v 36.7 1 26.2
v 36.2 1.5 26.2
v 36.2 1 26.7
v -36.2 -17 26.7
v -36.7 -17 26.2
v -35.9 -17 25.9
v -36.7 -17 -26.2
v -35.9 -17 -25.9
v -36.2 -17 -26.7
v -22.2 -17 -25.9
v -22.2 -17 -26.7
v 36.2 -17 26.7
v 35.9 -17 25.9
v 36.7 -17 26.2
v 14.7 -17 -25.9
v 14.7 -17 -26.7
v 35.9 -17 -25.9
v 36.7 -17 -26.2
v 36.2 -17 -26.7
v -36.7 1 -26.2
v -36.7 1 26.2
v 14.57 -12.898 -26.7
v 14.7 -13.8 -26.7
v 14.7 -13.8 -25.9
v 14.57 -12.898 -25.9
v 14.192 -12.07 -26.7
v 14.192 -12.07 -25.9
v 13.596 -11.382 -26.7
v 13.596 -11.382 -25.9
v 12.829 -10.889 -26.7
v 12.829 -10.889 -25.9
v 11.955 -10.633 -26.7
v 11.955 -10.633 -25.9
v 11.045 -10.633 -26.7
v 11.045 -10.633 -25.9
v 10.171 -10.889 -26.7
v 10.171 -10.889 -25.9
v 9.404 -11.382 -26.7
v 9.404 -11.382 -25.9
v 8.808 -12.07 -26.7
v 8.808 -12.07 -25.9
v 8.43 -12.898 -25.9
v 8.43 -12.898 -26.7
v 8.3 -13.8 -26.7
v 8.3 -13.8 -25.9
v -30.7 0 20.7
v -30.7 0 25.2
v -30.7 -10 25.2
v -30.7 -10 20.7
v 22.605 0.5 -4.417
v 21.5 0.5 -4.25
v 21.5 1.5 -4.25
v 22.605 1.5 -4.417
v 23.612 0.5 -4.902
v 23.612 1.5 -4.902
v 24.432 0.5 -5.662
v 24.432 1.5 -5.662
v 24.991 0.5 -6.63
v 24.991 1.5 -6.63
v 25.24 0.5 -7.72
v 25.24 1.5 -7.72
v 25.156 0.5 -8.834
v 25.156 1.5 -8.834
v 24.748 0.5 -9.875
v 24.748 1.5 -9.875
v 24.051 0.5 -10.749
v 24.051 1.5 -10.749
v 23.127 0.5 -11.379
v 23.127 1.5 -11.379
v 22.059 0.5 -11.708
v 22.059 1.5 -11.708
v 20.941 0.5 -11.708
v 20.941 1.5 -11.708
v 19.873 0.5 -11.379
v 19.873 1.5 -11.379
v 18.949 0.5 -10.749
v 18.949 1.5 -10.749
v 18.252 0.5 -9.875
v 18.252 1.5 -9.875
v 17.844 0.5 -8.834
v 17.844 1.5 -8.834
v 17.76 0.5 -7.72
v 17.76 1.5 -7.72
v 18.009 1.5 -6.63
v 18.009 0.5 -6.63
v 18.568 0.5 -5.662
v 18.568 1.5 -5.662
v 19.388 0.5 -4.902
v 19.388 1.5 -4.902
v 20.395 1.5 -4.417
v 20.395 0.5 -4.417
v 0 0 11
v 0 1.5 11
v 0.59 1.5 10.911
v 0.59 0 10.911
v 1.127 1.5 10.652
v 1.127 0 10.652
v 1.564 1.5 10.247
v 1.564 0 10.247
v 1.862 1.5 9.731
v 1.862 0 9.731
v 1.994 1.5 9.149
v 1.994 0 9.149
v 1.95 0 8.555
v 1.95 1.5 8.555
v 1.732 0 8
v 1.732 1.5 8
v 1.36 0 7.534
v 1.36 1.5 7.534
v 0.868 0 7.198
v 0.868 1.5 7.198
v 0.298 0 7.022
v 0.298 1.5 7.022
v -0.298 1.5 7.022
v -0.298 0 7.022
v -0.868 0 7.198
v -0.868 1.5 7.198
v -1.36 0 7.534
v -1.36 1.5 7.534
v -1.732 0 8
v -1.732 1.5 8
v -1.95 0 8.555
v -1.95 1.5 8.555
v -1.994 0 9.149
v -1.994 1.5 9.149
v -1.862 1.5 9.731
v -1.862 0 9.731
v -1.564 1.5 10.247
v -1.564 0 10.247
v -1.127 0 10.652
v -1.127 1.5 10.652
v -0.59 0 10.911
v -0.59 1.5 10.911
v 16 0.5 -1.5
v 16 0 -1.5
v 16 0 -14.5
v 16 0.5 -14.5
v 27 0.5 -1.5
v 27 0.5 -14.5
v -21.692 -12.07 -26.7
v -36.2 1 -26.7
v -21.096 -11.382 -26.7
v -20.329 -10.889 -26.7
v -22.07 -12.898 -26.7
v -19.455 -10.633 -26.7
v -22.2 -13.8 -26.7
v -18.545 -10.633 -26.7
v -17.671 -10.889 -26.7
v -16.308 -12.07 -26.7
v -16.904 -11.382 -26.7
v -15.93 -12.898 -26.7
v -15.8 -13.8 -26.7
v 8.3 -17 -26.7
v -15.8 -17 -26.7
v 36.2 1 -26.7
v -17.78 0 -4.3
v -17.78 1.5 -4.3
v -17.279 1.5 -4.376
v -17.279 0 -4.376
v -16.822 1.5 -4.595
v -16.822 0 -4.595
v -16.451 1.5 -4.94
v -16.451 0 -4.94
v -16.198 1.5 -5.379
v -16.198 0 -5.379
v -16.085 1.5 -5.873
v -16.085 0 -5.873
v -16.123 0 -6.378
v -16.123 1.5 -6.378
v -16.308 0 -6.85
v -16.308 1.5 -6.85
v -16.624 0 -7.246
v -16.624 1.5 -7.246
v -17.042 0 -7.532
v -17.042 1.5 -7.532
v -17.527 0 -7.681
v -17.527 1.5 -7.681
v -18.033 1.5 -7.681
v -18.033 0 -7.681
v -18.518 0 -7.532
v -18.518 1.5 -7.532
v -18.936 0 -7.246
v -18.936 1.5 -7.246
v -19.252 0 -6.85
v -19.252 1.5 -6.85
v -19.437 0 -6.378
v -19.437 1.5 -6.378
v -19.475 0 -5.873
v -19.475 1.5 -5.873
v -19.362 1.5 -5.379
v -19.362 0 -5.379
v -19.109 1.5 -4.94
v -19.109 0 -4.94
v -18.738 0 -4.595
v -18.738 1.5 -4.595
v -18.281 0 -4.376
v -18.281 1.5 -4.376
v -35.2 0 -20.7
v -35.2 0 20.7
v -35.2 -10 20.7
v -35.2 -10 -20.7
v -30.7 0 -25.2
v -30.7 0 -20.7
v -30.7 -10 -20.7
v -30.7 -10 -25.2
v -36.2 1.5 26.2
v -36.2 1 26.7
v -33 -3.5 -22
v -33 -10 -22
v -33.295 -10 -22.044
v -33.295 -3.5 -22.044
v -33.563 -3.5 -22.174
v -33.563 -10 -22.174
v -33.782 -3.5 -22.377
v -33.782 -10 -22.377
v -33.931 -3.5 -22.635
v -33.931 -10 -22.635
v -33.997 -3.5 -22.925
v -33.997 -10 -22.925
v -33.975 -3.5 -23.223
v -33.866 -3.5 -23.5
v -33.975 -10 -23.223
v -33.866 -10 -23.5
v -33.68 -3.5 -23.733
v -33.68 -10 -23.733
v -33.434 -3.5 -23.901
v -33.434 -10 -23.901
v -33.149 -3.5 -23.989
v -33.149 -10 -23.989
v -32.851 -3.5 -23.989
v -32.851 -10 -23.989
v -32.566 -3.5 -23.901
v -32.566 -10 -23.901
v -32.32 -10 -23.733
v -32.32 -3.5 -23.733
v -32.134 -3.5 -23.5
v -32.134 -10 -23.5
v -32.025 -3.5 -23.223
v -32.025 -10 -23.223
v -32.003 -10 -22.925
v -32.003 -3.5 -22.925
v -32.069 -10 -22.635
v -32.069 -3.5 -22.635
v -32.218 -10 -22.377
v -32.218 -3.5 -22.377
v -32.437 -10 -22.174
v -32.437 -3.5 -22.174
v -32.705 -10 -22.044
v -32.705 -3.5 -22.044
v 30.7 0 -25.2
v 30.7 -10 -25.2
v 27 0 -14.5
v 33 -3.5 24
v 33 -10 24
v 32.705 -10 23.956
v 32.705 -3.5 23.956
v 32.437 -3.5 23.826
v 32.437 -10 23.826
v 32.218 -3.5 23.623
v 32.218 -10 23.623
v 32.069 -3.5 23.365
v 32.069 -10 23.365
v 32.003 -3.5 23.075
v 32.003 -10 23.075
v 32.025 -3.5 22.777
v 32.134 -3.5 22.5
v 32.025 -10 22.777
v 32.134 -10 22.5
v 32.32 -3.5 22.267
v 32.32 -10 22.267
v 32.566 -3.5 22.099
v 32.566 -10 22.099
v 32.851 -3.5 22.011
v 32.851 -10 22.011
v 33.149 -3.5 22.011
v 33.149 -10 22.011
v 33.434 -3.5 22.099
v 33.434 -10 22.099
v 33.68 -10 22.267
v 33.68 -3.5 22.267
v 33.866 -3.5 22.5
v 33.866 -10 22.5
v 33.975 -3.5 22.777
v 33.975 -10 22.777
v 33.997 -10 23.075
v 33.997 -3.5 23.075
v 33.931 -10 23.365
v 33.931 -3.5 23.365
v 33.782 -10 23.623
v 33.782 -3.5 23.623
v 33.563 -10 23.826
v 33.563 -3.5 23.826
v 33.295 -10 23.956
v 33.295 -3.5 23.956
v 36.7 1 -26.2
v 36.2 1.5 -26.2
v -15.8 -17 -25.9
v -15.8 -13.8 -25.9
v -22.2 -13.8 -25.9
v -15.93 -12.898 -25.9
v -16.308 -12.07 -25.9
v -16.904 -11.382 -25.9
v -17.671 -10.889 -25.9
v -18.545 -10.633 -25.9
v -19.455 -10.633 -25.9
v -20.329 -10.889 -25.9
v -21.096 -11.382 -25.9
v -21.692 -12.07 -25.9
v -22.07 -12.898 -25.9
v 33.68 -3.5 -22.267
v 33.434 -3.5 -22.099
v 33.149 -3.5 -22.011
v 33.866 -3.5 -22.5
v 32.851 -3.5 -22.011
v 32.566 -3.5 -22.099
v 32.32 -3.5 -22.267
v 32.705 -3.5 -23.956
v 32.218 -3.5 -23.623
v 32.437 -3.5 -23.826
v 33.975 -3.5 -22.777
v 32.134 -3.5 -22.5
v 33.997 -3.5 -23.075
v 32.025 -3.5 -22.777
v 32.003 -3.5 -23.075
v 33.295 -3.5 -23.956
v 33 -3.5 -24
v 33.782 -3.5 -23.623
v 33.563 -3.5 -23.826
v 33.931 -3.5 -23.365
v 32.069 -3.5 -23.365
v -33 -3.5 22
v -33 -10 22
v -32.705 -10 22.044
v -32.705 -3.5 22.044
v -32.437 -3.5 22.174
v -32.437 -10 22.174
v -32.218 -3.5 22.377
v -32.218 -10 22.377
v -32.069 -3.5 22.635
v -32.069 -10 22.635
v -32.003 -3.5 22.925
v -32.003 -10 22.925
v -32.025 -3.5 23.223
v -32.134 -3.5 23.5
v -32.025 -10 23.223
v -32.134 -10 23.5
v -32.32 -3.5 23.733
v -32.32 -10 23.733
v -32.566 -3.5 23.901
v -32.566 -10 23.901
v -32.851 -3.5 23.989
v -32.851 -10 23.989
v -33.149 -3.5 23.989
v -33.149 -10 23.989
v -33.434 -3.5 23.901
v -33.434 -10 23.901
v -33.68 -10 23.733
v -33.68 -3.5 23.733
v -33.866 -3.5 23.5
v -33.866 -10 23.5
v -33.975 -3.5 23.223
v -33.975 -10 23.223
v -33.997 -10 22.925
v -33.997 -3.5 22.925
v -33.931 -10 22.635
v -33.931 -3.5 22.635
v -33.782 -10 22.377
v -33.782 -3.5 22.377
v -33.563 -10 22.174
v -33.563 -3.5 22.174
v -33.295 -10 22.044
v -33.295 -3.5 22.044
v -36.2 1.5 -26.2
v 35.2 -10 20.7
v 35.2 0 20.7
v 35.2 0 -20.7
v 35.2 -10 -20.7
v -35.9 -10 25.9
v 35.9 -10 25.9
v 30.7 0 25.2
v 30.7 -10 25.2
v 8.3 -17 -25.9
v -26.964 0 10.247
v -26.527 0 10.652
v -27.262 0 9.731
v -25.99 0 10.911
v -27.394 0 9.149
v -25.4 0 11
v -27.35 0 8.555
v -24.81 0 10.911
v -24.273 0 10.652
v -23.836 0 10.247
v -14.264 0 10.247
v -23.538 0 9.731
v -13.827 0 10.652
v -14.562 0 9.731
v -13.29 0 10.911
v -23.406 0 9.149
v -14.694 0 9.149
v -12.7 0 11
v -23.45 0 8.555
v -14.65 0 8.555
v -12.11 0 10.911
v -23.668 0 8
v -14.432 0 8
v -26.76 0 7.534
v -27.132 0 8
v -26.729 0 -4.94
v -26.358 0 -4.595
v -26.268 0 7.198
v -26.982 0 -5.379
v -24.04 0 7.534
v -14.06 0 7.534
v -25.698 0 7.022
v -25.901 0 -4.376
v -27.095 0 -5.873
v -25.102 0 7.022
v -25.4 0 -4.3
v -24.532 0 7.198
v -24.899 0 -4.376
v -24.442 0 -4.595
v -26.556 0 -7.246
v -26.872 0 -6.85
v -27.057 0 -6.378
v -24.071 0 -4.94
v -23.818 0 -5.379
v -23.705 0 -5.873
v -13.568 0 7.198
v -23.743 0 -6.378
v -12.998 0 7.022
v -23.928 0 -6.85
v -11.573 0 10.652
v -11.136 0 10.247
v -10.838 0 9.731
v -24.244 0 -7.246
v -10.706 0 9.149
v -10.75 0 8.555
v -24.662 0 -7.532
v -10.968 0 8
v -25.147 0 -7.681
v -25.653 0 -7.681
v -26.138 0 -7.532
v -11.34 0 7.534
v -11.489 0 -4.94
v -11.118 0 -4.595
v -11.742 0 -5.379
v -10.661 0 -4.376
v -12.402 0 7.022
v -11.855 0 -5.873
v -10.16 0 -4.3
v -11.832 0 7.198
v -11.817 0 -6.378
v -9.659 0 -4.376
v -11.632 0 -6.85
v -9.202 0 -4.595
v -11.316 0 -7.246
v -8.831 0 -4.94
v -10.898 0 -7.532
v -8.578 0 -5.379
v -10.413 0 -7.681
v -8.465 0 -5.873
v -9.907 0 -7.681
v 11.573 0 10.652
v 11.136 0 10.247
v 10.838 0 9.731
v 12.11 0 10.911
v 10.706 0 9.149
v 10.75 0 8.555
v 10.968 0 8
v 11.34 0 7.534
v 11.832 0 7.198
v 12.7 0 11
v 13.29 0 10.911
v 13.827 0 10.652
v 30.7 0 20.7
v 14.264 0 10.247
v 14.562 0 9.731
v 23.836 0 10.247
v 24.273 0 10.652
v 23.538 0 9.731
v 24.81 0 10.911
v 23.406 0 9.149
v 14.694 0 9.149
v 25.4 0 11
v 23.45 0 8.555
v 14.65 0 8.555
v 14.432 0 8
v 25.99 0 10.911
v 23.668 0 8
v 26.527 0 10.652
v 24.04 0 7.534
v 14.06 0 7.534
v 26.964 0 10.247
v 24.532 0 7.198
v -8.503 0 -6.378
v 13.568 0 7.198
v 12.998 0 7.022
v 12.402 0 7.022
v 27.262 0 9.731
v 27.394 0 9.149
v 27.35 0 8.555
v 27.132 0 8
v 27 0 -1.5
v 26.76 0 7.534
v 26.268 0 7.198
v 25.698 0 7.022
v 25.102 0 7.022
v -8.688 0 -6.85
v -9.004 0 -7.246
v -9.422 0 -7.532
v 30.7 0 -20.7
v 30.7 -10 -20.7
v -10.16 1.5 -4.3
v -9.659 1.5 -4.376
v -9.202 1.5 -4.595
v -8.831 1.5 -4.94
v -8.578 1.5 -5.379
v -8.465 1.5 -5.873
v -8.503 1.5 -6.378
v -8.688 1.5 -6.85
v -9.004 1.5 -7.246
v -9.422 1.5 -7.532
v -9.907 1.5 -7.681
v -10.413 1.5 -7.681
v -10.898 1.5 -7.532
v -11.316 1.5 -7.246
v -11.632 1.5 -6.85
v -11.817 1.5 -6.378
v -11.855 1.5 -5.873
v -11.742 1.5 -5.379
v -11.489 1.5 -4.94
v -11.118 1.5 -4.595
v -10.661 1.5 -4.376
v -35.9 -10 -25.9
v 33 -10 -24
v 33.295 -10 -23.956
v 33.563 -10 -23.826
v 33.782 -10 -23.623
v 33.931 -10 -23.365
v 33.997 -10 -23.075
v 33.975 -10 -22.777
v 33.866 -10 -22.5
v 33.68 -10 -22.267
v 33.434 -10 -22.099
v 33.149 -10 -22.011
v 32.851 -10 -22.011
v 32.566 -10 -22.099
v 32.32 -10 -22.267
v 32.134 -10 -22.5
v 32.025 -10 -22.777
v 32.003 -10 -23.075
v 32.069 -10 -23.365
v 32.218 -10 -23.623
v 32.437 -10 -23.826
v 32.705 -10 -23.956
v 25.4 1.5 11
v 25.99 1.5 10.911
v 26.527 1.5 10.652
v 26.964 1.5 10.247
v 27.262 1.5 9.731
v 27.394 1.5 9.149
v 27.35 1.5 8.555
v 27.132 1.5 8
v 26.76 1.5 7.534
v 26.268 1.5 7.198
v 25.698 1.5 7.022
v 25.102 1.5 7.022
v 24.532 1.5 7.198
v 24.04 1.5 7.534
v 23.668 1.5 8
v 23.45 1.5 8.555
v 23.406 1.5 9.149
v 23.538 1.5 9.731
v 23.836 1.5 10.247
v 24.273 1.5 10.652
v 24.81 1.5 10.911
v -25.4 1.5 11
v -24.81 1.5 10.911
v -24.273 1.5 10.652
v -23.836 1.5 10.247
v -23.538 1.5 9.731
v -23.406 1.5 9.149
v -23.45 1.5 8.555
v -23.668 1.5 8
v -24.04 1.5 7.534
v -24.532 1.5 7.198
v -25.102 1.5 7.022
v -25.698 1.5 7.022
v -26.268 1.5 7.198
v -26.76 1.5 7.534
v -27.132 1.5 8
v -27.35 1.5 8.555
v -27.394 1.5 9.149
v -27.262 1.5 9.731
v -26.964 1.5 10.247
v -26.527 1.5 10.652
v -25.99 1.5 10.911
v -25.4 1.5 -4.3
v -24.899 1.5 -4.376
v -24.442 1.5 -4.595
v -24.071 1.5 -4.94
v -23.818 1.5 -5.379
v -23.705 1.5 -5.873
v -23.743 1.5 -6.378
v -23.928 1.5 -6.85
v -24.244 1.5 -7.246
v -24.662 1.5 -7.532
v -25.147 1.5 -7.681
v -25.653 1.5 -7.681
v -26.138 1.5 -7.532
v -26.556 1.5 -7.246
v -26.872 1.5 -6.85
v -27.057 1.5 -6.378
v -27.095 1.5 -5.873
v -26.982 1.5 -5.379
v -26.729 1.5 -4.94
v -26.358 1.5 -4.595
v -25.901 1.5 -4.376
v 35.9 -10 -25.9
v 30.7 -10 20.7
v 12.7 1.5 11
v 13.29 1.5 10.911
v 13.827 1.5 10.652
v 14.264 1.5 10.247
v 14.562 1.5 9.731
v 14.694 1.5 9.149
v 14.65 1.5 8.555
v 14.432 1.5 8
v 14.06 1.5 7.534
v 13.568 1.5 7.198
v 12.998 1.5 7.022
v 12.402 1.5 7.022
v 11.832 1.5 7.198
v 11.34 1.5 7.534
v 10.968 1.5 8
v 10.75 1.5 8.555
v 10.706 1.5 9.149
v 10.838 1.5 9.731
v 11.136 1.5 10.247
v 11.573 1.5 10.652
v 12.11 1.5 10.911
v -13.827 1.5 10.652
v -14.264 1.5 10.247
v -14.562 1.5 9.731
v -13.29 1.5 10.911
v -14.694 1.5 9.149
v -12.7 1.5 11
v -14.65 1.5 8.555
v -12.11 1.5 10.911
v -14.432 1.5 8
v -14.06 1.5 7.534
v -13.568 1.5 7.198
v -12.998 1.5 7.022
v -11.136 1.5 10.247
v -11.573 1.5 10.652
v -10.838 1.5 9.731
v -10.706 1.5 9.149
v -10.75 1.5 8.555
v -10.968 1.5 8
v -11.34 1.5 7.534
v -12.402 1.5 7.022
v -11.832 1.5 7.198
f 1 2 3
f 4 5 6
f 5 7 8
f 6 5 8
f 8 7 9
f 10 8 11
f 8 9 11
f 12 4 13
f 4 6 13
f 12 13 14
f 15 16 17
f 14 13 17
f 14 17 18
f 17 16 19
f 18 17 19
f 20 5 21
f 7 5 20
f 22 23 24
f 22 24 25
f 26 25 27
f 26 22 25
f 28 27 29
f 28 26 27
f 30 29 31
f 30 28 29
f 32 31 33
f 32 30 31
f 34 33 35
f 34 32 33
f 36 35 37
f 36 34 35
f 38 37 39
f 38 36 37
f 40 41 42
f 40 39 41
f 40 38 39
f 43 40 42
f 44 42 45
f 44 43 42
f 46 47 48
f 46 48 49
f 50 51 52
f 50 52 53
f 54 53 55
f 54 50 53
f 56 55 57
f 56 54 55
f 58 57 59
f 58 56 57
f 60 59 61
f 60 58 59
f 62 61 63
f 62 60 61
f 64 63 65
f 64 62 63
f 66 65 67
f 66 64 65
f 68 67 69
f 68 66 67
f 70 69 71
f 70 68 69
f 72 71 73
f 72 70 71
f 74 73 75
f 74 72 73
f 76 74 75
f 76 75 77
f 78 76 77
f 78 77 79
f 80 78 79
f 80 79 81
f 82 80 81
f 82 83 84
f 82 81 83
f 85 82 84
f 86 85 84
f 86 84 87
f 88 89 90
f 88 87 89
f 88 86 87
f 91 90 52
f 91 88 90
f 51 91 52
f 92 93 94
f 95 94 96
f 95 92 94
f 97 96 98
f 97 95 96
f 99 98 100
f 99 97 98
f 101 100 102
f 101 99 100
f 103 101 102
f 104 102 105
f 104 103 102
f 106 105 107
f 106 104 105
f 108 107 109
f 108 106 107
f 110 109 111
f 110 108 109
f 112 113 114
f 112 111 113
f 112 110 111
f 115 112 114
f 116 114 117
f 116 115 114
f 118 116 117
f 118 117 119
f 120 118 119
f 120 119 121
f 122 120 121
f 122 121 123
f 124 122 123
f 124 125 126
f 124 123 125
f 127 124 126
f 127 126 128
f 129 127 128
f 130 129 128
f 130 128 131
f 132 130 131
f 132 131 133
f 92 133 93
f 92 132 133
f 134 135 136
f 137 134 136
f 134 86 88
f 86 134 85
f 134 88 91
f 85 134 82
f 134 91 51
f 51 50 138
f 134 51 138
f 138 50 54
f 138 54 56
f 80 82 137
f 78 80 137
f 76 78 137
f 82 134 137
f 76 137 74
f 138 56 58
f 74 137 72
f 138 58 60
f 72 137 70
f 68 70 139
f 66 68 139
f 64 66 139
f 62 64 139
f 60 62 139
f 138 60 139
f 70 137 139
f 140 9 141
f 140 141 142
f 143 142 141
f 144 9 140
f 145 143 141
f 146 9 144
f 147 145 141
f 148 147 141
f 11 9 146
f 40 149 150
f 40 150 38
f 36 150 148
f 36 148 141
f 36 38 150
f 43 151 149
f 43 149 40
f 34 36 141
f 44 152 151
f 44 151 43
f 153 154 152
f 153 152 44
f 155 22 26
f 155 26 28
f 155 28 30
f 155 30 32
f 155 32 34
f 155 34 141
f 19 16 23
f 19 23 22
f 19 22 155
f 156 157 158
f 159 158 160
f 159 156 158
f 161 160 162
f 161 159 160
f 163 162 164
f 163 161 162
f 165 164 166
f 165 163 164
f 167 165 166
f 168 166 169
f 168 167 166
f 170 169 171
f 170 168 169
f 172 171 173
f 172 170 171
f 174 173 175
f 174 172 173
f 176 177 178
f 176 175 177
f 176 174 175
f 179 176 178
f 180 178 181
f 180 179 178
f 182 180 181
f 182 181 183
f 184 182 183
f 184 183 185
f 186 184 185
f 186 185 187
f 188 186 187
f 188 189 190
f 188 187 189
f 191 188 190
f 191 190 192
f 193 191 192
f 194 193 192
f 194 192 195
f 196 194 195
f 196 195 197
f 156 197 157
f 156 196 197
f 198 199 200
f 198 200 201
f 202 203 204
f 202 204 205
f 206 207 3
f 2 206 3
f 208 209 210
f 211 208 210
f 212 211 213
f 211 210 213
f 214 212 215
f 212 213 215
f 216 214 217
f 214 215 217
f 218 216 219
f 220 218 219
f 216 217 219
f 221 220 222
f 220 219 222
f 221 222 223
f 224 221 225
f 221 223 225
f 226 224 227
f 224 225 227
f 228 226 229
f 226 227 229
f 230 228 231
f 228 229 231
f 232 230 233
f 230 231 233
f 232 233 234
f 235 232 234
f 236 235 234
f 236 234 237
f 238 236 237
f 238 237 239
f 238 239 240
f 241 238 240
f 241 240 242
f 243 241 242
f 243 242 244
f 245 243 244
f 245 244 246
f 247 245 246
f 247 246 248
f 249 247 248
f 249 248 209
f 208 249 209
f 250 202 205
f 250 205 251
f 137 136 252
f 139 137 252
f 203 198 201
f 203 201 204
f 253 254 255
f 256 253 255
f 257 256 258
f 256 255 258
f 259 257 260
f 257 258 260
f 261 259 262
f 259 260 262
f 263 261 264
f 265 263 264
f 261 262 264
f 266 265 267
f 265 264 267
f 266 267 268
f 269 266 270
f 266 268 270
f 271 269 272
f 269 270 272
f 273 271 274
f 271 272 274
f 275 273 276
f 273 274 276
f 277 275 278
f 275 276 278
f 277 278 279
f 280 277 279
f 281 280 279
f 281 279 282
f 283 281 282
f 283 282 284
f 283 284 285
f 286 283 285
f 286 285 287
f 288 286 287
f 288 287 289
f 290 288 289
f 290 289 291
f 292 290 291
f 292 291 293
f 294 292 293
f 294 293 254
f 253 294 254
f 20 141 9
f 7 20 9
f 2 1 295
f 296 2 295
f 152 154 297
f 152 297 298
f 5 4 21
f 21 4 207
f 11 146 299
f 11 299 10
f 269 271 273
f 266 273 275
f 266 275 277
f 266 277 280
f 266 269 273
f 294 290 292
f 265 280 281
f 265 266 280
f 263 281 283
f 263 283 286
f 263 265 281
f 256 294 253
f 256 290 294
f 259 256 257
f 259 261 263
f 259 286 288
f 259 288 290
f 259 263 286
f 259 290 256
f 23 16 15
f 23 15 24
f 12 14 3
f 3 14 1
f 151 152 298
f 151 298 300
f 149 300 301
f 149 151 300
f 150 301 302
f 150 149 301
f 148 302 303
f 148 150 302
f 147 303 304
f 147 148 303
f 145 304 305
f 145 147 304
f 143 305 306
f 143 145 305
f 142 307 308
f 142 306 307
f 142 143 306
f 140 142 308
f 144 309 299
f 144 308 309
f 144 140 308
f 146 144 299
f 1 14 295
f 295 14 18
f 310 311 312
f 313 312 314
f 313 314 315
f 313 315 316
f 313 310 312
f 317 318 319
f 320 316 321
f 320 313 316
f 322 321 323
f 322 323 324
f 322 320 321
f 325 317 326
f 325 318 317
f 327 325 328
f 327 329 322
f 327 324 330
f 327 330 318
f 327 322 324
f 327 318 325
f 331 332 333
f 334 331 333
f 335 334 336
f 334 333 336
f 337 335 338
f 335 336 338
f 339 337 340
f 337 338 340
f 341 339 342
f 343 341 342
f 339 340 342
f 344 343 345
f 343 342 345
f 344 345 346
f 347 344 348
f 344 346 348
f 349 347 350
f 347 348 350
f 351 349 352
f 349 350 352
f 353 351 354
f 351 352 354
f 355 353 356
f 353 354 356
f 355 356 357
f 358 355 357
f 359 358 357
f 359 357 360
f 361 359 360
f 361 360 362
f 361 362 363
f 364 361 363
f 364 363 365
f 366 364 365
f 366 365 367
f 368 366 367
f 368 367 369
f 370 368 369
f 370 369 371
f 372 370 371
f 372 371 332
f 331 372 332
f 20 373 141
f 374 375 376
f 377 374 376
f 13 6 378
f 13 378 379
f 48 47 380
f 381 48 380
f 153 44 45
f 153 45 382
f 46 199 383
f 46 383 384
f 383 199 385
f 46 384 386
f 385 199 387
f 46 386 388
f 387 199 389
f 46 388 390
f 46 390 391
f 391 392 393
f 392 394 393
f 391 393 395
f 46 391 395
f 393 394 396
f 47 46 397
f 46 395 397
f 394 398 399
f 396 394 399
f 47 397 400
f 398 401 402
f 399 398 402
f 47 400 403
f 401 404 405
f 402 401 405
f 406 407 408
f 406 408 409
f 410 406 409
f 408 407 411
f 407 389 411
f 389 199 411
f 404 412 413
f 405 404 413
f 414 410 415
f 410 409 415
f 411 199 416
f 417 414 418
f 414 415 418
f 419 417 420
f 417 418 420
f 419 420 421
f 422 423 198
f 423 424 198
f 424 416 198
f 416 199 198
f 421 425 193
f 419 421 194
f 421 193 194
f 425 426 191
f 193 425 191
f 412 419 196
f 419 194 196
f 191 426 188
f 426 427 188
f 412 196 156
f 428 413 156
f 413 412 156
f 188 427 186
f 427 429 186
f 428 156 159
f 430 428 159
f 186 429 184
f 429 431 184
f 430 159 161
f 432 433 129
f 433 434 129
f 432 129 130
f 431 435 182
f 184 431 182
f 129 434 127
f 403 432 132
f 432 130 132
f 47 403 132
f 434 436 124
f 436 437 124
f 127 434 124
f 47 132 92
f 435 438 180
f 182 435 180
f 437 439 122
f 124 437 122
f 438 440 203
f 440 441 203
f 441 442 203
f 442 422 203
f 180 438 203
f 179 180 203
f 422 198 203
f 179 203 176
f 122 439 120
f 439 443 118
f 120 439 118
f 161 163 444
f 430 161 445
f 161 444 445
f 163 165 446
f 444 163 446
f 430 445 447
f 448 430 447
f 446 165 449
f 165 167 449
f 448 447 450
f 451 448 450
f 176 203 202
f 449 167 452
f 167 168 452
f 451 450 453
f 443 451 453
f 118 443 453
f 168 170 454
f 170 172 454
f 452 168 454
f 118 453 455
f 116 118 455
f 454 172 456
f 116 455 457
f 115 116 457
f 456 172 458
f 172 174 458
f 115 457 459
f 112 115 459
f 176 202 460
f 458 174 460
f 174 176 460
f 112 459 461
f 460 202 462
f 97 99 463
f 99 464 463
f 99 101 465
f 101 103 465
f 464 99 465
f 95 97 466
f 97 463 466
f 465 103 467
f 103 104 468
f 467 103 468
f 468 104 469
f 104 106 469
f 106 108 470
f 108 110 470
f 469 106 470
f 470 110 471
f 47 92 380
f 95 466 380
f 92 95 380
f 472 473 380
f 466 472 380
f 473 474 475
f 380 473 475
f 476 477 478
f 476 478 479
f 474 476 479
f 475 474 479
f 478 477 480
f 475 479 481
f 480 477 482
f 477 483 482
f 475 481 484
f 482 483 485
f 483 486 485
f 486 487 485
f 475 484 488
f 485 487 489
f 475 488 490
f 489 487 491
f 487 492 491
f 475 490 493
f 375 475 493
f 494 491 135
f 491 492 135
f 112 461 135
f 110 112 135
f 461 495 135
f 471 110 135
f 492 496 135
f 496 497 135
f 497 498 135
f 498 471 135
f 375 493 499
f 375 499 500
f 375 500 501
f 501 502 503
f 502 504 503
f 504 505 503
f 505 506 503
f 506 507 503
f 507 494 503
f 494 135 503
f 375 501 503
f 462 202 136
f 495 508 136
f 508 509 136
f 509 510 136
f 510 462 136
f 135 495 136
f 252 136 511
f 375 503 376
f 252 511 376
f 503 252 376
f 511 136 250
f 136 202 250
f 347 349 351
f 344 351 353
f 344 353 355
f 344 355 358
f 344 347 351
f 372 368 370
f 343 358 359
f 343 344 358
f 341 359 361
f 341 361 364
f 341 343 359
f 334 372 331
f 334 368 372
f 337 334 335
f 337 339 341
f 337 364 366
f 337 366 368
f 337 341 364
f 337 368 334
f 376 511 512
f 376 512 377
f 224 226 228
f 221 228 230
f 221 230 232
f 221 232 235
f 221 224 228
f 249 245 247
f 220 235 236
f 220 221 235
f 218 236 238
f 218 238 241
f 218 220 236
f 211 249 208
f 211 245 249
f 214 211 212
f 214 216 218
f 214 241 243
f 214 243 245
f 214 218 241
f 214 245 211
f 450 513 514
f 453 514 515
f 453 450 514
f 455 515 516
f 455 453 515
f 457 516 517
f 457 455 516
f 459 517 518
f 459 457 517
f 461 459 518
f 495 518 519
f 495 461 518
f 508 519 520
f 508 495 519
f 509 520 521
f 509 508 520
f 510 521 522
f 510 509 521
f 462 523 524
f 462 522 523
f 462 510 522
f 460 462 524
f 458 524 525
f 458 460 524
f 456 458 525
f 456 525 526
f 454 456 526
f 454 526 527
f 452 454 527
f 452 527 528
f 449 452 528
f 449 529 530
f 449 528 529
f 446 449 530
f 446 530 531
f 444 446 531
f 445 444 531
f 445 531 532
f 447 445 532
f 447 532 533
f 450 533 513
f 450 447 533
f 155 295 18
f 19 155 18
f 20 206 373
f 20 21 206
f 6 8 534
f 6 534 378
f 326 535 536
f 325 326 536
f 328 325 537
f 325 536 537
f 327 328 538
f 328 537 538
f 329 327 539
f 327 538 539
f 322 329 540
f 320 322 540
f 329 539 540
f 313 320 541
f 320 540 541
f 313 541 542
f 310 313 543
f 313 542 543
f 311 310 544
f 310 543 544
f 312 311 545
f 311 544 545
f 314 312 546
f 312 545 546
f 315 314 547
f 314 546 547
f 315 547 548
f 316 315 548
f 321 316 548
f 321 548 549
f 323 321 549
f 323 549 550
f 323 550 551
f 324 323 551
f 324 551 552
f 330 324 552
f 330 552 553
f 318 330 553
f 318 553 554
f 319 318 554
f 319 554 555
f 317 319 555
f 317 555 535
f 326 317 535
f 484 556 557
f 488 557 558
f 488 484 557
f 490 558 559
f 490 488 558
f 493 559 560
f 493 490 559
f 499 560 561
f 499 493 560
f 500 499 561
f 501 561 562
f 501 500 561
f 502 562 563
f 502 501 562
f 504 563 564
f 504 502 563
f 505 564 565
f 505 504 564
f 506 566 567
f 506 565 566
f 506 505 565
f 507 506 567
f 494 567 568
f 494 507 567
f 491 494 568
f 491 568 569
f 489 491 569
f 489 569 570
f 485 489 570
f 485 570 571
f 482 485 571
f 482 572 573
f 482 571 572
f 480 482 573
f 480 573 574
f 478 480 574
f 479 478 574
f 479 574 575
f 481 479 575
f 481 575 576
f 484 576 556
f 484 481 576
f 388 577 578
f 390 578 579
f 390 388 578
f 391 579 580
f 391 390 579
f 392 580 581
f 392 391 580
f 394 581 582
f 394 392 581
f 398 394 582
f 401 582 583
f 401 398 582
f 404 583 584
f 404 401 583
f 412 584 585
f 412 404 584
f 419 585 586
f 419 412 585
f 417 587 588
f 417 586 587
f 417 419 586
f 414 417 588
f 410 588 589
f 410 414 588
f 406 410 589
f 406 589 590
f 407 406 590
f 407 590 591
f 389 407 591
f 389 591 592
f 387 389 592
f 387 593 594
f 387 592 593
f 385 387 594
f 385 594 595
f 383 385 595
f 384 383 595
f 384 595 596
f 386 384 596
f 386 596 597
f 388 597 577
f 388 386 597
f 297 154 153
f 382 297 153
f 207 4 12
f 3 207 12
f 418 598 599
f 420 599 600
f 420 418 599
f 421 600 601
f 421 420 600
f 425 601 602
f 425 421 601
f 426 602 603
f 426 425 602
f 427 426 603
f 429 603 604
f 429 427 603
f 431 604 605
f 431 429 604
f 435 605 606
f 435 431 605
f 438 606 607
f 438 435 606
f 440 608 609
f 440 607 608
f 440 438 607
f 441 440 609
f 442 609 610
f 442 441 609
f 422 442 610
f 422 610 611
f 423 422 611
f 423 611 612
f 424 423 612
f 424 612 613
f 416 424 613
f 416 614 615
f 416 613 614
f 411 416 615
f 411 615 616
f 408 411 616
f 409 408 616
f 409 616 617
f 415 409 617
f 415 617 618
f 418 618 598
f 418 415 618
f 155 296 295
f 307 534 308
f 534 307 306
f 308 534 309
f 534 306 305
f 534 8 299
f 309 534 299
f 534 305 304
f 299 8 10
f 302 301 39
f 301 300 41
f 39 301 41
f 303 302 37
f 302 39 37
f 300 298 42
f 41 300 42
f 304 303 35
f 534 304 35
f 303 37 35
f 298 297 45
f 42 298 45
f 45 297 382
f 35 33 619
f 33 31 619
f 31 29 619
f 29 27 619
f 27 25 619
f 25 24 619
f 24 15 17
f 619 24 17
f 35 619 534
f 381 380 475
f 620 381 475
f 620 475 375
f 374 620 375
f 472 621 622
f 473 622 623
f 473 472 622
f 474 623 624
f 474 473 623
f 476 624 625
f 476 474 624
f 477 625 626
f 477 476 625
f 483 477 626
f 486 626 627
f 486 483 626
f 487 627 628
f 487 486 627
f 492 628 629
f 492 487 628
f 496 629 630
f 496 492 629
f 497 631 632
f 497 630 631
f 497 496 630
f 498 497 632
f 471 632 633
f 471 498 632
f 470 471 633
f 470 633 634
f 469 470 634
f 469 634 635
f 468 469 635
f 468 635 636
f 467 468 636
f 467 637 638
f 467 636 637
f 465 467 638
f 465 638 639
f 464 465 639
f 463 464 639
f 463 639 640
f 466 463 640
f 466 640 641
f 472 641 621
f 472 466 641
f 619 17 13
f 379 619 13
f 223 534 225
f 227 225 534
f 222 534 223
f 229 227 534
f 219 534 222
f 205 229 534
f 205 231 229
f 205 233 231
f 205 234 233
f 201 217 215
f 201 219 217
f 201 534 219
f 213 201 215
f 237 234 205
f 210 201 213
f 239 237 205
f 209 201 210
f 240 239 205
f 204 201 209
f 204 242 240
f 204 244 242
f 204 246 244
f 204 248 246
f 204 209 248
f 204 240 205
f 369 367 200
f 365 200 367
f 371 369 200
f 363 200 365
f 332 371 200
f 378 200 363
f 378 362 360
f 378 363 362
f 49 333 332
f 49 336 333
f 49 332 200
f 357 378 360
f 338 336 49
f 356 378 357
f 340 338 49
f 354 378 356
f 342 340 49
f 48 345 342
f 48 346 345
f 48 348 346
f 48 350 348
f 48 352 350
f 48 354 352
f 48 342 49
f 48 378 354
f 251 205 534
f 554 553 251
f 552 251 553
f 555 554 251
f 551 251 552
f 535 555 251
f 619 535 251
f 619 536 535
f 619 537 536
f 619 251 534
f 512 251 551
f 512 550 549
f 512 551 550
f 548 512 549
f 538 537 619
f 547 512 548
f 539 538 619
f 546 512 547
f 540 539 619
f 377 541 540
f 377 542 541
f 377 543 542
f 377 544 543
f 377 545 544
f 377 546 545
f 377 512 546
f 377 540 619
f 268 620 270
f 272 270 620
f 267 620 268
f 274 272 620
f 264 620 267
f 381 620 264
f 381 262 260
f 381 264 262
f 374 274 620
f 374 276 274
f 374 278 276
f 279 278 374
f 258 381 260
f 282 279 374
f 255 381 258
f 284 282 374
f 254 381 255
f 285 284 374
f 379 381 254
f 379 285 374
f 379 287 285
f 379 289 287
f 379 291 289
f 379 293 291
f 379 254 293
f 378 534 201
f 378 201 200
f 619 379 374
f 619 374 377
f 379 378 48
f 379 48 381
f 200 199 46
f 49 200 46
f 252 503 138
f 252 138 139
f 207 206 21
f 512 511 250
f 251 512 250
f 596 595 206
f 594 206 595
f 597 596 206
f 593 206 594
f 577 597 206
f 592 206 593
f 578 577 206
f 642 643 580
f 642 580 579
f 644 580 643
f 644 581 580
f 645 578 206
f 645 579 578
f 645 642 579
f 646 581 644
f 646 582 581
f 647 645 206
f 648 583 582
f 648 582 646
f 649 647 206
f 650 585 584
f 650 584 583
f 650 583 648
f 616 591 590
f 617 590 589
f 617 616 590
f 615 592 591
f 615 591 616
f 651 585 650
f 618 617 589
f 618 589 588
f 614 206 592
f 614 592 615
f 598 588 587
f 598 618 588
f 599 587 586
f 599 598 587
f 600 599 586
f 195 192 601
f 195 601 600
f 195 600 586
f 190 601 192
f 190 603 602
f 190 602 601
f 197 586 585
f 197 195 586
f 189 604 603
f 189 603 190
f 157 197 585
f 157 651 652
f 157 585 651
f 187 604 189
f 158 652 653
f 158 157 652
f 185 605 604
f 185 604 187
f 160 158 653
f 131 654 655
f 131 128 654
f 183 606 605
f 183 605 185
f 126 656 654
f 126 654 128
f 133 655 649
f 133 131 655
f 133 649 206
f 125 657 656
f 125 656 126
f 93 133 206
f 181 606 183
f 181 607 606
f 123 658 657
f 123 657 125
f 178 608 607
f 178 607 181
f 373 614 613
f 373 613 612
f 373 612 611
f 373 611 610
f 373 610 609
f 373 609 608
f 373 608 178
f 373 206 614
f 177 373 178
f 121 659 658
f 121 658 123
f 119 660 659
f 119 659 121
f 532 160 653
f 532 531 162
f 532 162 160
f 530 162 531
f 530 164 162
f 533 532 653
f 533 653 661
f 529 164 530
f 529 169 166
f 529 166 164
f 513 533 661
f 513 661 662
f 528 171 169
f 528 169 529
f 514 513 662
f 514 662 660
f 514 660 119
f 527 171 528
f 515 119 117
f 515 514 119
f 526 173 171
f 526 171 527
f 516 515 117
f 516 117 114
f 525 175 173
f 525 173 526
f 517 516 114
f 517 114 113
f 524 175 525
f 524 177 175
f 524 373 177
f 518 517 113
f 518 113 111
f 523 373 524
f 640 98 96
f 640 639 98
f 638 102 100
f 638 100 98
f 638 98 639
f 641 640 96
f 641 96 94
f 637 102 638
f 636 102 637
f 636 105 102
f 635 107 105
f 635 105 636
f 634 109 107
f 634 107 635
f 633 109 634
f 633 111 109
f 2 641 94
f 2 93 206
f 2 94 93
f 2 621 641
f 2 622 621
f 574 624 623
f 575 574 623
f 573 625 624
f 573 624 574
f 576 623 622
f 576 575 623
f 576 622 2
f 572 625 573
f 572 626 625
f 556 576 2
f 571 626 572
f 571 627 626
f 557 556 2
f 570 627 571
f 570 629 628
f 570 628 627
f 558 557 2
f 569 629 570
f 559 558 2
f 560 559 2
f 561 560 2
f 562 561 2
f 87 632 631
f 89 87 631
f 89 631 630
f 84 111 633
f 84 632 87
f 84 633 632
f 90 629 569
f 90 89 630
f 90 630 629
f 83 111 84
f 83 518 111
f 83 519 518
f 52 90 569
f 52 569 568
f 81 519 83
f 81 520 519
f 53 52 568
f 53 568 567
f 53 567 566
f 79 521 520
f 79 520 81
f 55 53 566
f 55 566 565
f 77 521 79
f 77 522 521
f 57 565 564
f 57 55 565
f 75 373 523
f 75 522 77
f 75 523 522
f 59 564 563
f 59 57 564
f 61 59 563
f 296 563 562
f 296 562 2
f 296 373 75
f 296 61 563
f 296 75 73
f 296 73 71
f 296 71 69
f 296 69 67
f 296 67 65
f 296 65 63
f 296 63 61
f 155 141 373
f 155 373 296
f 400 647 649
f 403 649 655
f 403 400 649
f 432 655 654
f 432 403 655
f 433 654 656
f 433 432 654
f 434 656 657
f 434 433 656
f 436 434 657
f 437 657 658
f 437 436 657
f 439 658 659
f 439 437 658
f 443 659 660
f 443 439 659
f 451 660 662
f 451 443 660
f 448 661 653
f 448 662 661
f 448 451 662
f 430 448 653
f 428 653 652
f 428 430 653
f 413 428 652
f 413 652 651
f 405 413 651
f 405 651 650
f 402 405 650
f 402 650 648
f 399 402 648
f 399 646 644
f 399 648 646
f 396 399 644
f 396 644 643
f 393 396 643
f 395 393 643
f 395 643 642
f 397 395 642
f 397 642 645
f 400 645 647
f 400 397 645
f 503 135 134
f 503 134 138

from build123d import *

# Parameters (mm, degrees)
SKETCH_1_W          = 73.4
SKETCH_1_H          = 53.4
SKETCH_1_W_2        = 70.4
SKETCH_1_H_2        = 50.4
EXTRUDE_1_DEPTH     = 17
SKETCH_2_W          = 73.4
SKETCH_2_H          = 53.4
EXTRUDE_2_DEPTH     = 1.5
SKETCH_3_W          = 4.5
SKETCH_3_H          = 4.5
EXTRUDE_3_DEPTH     = 10.5
CUT_EXTRUDE_1_REACH = 50.464
SKETCH_4_R          = 2
SKETCH_4_R_2        = 1.7
SKETCH_4_R_3        = 3.75
SKETCH_5_R          = 1
CUT_EXTRUDE_2_DEPTH = 7
SKETCH_6_W          = 71.8
SKETCH_6_H          = 51.8
CUT_EXTRUDE_3_DEPTH = 7
CHAMFER_1_SIZE      = 0.5
CUT_EXTRUDE_4_REACH = 68.988
SKETCH_9_W          = 11
SKETCH_9_H          = 13
CUT_EXTRUDE_5_DEPTH = 0.5


with BuildPart() as part:
    # Эскиз1 → Бобышка-Вытянуть1 (new body)
    with BuildSketch(Plane(origin=(0, 0, 0), x_dir=(1, 0, 0), z_dir=(0, 1, 0))):
        Rectangle(SKETCH_1_W, SKETCH_1_H)
        Rectangle(SKETCH_1_W_2, SKETCH_1_H_2, mode=Mode.SUBTRACT)
    extrude(amount=-EXTRUDE_1_DEPTH)

    # Эскиз2 → Бобышка-Вытянуть2 (add)
    with BuildSketch(Plane(origin=(0, 0, 0), x_dir=(1, 0, 0), z_dir=(0, 1, 0))):
        Rectangle(SKETCH_2_W, SKETCH_2_H)
    extrude(amount=EXTRUDE_2_DEPTH)

    # Эскиз3 → Бобышка-Вытянуть3 (add)
    with BuildSketch(Plane(origin=(0, 0, 0), x_dir=(1, 0, 0), z_dir=(0, 1, 0))):
        with Locations((-32.95, 22.95)):
            Rectangle(SKETCH_3_W, SKETCH_3_H)
        with Locations((32.95, 22.95)):
            Rectangle(SKETCH_3_W, SKETCH_3_H)
        with Locations((-32.95, -22.95)):
            Rectangle(SKETCH_3_W, SKETCH_3_H)
        with Locations((32.95, -22.95)):
            Rectangle(SKETCH_3_W, SKETCH_3_H)
    extrude(amount=-EXTRUDE_3_DEPTH)

    # Эскиз4 → Вырез-Вытянуть1 (cut, up to next)
    with BuildSketch(Plane(origin=(0, 0, 0), x_dir=(1, 0, 0), z_dir=(0, 1, 0)), mode=Mode.PRIVATE) as cut_extrude_1_sk1:
        with Locations(Location((-25.4, -9, 0), (0, 0, 270))):
            Circle(SKETCH_4_R)
    cut_extrude_1_tool1 = extrude(cut_extrude_1_sk1.sketch, amount=CUT_EXTRUDE_1_REACH, mode=Mode.PRIVATE) & part.part
    # Эскиз4 → Вырез-Вытянуть1 (cut, up to next)
    with BuildSketch(Plane(origin=(0, 0, 0), x_dir=(1, 0, 0), z_dir=(0, 1, 0)), mode=Mode.PRIVATE) as cut_extrude_1_sk2:
        with Locations(Location((-12.7, -9, 0), (0, 0, 270))):
            Circle(SKETCH_4_R)
    cut_extrude_1_tool2 = extrude(cut_extrude_1_sk2.sketch, amount=CUT_EXTRUDE_1_REACH, mode=Mode.PRIVATE) & part.part
    # Эскиз4 → Вырез-Вытянуть1 (cut, up to next)
    with BuildSketch(Plane(origin=(0, 0, 0), x_dir=(1, 0, 0), z_dir=(0, 1, 0)), mode=Mode.PRIVATE) as cut_extrude_1_sk3:
        with Locations(Location((0, -9, 0), (0, 0, 270))):
            Circle(SKETCH_4_R)
    cut_extrude_1_tool3 = extrude(cut_extrude_1_sk3.sketch, amount=CUT_EXTRUDE_1_REACH, mode=Mode.PRIVATE) & part.part
    # Эскиз4 → Вырез-Вытянуть1 (cut, up to next)
    with BuildSketch(Plane(origin=(0, 0, 0), x_dir=(1, 0, 0), z_dir=(0, 1, 0)), mode=Mode.PRIVATE) as cut_extrude_1_sk4:
        with Locations(Location((12.7, -9, 0), (0, 0, 270))):
            Circle(SKETCH_4_R)
    cut_extrude_1_tool4 = extrude(cut_extrude_1_sk4.sketch, amount=CUT_EXTRUDE_1_REACH, mode=Mode.PRIVATE) & part.part
    # Эскиз4 → Вырез-Вытянуть1 (cut, up to next)
    with BuildSketch(Plane(origin=(0, 0, 0), x_dir=(1, 0, 0), z_dir=(0, 1, 0)), mode=Mode.PRIVATE) as cut_extrude_1_sk5:
        with Locations(Location((25.4, -9, 0), (0, 0, 270))):
            Circle(SKETCH_4_R)
    cut_extrude_1_tool5 = extrude(cut_extrude_1_sk5.sketch, amount=CUT_EXTRUDE_1_REACH, mode=Mode.PRIVATE) & part.part
    # Эскиз4 → Вырез-Вытянуть1 (cut, up to next)
    with BuildSketch(Plane(origin=(0, 0, 0), x_dir=(1, 0, 0), z_dir=(0, 1, 0)), mode=Mode.PRIVATE) as cut_extrude_1_sk6:
        with Locations(Location((-25.4, 6, 0), (0, 0, 270))):
            Circle(SKETCH_4_R_2)
    cut_extrude_1_tool6 = extrude(cut_extrude_1_sk6.sketch, amount=CUT_EXTRUDE_1_REACH, mode=Mode.PRIVATE) & part.part
    # Эскиз4 → Вырез-Вытянуть1 (cut, up to next)
    with BuildSketch(Plane(origin=(0, 0, 0), x_dir=(1, 0, 0), z_dir=(0, 1, 0)), mode=Mode.PRIVATE) as cut_extrude_1_sk7:
        with Locations(Location((-17.78, 6, 0), (0, 0, 270))):
            Circle(SKETCH_4_R_2)
    cut_extrude_1_tool7 = extrude(cut_extrude_1_sk7.sketch, amount=CUT_EXTRUDE_1_REACH, mode=Mode.PRIVATE) & part.part
    # Эскиз4 → Вырез-Вытянуть1 (cut, up to next)
    with BuildSketch(Plane(origin=(0, 0, 0), x_dir=(1, 0, 0), z_dir=(0, 1, 0)), mode=Mode.PRIVATE) as cut_extrude_1_sk8:
        with Locations(Location((-10.16, 6, 0), (0, 0, 270))):
            Circle(SKETCH_4_R_2)
    cut_extrude_1_tool8 = extrude(cut_extrude_1_sk8.sketch, amount=CUT_EXTRUDE_1_REACH, mode=Mode.PRIVATE) & part.part
    # Эскиз4 → Вырез-Вытянуть1 (cut, up to next)
    with BuildSketch(Plane(origin=(0, 0, 0), x_dir=(1, 0, 0), z_dir=(0, 1, 0)), mode=Mode.PRIVATE) as cut_extrude_1_sk9:
        with Locations(Location((21.5, 8, 0), (0, 0, 270))):
            Circle(SKETCH_4_R_3)
    cut_extrude_1_tool9 = extrude(cut_extrude_1_sk9.sketch, amount=CUT_EXTRUDE_1_REACH, mode=Mode.PRIVATE) & part.part
    add(cut_extrude_1_tool1.solids().sort_by_distance((-25.4, 0, 9))[0], mode=Mode.SUBTRACT)
    add(cut_extrude_1_tool2.solids().sort_by_distance((-12.7, 0, 9))[0], mode=Mode.SUBTRACT)
    add(cut_extrude_1_tool3.solids().sort_by_distance((0, 0, 9))[0], mode=Mode.SUBTRACT)
    add(cut_extrude_1_tool4.solids().sort_by_distance((12.7, 0, 9))[0], mode=Mode.SUBTRACT)
    add(cut_extrude_1_tool5.solids().sort_by_distance((25.4, 0, 9))[0], mode=Mode.SUBTRACT)
    add(cut_extrude_1_tool6.solids().sort_by_distance((-25.4, 0, -6))[0], mode=Mode.SUBTRACT)
    add(cut_extrude_1_tool7.solids().sort_by_distance((-17.78, 0, -6))[0], mode=Mode.SUBTRACT)
    add(cut_extrude_1_tool8.solids().sort_by_distance((-10.16, 0, -6))[0], mode=Mode.SUBTRACT)
    add(cut_extrude_1_tool9.solids().sort_by_distance((21.5, 0, -8))[0], mode=Mode.SUBTRACT)

    # Эскиз5 → Вырез-Вытянуть2 (cut)
    with BuildSketch(Plane.XZ.offset(10.5)):
        with Locations(Location((-33, 23, 0), (0, 0, 270))):
            Circle(SKETCH_5_R)
        with Locations(Location((33, 23, 0), (0, 0, 90))):
            Circle(SKETCH_5_R)
        with Locations(Location((33, -23, 0), (0, 0, 270))):
            Circle(SKETCH_5_R)
        with Locations(Location((-33, -23, 0), (0, 0, 90))):
            Circle(SKETCH_5_R)
    extrude(amount=-CUT_EXTRUDE_2_DEPTH, mode=Mode.SUBTRACT)

    # Эскиз6 → Вырез-Вытянуть3 (cut)
    with BuildSketch(Plane.XZ.offset(17)):
        Rectangle(SKETCH_6_W, SKETCH_6_H)
    extrude(amount=-CUT_EXTRUDE_3_DEPTH, mode=Mode.SUBTRACT)

    # Фаска1
    chamfer_1_edges = [part.edges().sort_by_distance(p)[0] for p in [
        (-36.7, 1.5, 0),
        (0, 1.5, 26.7),
        (36.7, 1.5, 0),
        (0, 1.5, -26.7),
        (-36.7, -7.75, -26.7),
        (36.7, -7.75, -26.7),
        (36.7, -7.75, 26.7),
        (-36.7, -7.75, 26.7),
    ]]
    chamfer(chamfer_1_edges, length=CHAMFER_1_SIZE)

    # Эскиз7 → Вырез-Вытянуть4 (cut, up to next)
    with BuildSketch(Plane(origin=(0, 0, -26.7), x_dir=(-1, 0, 0), z_dir=(0, 0, -1)), mode=Mode.PRIVATE) as cut_extrude_4_sk1:
        with BuildLine():
            Line((-8.3, -13.8), (-8.3, -17))
            Line((-8.3, -17), (-14.7, -17))
            Line((-14.7, -17), (-14.7, -13.8))
            ThreePointArc((-14.7, -13.8), (-11.5, -10.6), (-8.3, -13.8))
        make_face()
    cut_extrude_4_tool1 = extrude(cut_extrude_4_sk1.sketch, amount=-CUT_EXTRUDE_4_REACH, mode=Mode.PRIVATE) & part.part
    # Эскиз7 → Вырез-Вытянуть4 (cut, up to next)
    with BuildSketch(Plane(origin=(0, 0, -26.7), x_dir=(-1, 0, 0), z_dir=(0, 0, -1)), mode=Mode.PRIVATE) as cut_extrude_4_sk2:
        with BuildLine():
            Line((22.2, -13.8), (22.2, -17))
            Line((22.2, -17), (15.8, -17))
            Line((15.8, -17), (15.8, -13.8))
            ThreePointArc((15.8, -13.8), (19, -10.6), (22.2, -13.8))
        make_face()
    cut_extrude_4_tool2 = extrude(cut_extrude_4_sk2.sketch, amount=-CUT_EXTRUDE_4_REACH, mode=Mode.PRIVATE) & part.part
    add(cut_extrude_4_tool1.solids().sort_by_distance((11.5, -14.09872, -26.7))[0], mode=Mode.SUBTRACT)
    add(cut_extrude_4_tool2.solids().sort_by_distance((-19, -14.09872, -26.7))[0], mode=Mode.SUBTRACT)

    # Эскиз9 → Вырез-Вытянуть5 (cut)
    with BuildSketch(Plane(origin=(0, 0, 0), x_dir=(1, 0, 0), z_dir=(0, 1, 0))):
        with Locations((21.5, 8)):
            Rectangle(SKETCH_9_W, SKETCH_9_H)
    extrude(amount=CUT_EXTRUDE_5_DEPTH, mode=Mode.SUBTRACT)


solid = part.part
